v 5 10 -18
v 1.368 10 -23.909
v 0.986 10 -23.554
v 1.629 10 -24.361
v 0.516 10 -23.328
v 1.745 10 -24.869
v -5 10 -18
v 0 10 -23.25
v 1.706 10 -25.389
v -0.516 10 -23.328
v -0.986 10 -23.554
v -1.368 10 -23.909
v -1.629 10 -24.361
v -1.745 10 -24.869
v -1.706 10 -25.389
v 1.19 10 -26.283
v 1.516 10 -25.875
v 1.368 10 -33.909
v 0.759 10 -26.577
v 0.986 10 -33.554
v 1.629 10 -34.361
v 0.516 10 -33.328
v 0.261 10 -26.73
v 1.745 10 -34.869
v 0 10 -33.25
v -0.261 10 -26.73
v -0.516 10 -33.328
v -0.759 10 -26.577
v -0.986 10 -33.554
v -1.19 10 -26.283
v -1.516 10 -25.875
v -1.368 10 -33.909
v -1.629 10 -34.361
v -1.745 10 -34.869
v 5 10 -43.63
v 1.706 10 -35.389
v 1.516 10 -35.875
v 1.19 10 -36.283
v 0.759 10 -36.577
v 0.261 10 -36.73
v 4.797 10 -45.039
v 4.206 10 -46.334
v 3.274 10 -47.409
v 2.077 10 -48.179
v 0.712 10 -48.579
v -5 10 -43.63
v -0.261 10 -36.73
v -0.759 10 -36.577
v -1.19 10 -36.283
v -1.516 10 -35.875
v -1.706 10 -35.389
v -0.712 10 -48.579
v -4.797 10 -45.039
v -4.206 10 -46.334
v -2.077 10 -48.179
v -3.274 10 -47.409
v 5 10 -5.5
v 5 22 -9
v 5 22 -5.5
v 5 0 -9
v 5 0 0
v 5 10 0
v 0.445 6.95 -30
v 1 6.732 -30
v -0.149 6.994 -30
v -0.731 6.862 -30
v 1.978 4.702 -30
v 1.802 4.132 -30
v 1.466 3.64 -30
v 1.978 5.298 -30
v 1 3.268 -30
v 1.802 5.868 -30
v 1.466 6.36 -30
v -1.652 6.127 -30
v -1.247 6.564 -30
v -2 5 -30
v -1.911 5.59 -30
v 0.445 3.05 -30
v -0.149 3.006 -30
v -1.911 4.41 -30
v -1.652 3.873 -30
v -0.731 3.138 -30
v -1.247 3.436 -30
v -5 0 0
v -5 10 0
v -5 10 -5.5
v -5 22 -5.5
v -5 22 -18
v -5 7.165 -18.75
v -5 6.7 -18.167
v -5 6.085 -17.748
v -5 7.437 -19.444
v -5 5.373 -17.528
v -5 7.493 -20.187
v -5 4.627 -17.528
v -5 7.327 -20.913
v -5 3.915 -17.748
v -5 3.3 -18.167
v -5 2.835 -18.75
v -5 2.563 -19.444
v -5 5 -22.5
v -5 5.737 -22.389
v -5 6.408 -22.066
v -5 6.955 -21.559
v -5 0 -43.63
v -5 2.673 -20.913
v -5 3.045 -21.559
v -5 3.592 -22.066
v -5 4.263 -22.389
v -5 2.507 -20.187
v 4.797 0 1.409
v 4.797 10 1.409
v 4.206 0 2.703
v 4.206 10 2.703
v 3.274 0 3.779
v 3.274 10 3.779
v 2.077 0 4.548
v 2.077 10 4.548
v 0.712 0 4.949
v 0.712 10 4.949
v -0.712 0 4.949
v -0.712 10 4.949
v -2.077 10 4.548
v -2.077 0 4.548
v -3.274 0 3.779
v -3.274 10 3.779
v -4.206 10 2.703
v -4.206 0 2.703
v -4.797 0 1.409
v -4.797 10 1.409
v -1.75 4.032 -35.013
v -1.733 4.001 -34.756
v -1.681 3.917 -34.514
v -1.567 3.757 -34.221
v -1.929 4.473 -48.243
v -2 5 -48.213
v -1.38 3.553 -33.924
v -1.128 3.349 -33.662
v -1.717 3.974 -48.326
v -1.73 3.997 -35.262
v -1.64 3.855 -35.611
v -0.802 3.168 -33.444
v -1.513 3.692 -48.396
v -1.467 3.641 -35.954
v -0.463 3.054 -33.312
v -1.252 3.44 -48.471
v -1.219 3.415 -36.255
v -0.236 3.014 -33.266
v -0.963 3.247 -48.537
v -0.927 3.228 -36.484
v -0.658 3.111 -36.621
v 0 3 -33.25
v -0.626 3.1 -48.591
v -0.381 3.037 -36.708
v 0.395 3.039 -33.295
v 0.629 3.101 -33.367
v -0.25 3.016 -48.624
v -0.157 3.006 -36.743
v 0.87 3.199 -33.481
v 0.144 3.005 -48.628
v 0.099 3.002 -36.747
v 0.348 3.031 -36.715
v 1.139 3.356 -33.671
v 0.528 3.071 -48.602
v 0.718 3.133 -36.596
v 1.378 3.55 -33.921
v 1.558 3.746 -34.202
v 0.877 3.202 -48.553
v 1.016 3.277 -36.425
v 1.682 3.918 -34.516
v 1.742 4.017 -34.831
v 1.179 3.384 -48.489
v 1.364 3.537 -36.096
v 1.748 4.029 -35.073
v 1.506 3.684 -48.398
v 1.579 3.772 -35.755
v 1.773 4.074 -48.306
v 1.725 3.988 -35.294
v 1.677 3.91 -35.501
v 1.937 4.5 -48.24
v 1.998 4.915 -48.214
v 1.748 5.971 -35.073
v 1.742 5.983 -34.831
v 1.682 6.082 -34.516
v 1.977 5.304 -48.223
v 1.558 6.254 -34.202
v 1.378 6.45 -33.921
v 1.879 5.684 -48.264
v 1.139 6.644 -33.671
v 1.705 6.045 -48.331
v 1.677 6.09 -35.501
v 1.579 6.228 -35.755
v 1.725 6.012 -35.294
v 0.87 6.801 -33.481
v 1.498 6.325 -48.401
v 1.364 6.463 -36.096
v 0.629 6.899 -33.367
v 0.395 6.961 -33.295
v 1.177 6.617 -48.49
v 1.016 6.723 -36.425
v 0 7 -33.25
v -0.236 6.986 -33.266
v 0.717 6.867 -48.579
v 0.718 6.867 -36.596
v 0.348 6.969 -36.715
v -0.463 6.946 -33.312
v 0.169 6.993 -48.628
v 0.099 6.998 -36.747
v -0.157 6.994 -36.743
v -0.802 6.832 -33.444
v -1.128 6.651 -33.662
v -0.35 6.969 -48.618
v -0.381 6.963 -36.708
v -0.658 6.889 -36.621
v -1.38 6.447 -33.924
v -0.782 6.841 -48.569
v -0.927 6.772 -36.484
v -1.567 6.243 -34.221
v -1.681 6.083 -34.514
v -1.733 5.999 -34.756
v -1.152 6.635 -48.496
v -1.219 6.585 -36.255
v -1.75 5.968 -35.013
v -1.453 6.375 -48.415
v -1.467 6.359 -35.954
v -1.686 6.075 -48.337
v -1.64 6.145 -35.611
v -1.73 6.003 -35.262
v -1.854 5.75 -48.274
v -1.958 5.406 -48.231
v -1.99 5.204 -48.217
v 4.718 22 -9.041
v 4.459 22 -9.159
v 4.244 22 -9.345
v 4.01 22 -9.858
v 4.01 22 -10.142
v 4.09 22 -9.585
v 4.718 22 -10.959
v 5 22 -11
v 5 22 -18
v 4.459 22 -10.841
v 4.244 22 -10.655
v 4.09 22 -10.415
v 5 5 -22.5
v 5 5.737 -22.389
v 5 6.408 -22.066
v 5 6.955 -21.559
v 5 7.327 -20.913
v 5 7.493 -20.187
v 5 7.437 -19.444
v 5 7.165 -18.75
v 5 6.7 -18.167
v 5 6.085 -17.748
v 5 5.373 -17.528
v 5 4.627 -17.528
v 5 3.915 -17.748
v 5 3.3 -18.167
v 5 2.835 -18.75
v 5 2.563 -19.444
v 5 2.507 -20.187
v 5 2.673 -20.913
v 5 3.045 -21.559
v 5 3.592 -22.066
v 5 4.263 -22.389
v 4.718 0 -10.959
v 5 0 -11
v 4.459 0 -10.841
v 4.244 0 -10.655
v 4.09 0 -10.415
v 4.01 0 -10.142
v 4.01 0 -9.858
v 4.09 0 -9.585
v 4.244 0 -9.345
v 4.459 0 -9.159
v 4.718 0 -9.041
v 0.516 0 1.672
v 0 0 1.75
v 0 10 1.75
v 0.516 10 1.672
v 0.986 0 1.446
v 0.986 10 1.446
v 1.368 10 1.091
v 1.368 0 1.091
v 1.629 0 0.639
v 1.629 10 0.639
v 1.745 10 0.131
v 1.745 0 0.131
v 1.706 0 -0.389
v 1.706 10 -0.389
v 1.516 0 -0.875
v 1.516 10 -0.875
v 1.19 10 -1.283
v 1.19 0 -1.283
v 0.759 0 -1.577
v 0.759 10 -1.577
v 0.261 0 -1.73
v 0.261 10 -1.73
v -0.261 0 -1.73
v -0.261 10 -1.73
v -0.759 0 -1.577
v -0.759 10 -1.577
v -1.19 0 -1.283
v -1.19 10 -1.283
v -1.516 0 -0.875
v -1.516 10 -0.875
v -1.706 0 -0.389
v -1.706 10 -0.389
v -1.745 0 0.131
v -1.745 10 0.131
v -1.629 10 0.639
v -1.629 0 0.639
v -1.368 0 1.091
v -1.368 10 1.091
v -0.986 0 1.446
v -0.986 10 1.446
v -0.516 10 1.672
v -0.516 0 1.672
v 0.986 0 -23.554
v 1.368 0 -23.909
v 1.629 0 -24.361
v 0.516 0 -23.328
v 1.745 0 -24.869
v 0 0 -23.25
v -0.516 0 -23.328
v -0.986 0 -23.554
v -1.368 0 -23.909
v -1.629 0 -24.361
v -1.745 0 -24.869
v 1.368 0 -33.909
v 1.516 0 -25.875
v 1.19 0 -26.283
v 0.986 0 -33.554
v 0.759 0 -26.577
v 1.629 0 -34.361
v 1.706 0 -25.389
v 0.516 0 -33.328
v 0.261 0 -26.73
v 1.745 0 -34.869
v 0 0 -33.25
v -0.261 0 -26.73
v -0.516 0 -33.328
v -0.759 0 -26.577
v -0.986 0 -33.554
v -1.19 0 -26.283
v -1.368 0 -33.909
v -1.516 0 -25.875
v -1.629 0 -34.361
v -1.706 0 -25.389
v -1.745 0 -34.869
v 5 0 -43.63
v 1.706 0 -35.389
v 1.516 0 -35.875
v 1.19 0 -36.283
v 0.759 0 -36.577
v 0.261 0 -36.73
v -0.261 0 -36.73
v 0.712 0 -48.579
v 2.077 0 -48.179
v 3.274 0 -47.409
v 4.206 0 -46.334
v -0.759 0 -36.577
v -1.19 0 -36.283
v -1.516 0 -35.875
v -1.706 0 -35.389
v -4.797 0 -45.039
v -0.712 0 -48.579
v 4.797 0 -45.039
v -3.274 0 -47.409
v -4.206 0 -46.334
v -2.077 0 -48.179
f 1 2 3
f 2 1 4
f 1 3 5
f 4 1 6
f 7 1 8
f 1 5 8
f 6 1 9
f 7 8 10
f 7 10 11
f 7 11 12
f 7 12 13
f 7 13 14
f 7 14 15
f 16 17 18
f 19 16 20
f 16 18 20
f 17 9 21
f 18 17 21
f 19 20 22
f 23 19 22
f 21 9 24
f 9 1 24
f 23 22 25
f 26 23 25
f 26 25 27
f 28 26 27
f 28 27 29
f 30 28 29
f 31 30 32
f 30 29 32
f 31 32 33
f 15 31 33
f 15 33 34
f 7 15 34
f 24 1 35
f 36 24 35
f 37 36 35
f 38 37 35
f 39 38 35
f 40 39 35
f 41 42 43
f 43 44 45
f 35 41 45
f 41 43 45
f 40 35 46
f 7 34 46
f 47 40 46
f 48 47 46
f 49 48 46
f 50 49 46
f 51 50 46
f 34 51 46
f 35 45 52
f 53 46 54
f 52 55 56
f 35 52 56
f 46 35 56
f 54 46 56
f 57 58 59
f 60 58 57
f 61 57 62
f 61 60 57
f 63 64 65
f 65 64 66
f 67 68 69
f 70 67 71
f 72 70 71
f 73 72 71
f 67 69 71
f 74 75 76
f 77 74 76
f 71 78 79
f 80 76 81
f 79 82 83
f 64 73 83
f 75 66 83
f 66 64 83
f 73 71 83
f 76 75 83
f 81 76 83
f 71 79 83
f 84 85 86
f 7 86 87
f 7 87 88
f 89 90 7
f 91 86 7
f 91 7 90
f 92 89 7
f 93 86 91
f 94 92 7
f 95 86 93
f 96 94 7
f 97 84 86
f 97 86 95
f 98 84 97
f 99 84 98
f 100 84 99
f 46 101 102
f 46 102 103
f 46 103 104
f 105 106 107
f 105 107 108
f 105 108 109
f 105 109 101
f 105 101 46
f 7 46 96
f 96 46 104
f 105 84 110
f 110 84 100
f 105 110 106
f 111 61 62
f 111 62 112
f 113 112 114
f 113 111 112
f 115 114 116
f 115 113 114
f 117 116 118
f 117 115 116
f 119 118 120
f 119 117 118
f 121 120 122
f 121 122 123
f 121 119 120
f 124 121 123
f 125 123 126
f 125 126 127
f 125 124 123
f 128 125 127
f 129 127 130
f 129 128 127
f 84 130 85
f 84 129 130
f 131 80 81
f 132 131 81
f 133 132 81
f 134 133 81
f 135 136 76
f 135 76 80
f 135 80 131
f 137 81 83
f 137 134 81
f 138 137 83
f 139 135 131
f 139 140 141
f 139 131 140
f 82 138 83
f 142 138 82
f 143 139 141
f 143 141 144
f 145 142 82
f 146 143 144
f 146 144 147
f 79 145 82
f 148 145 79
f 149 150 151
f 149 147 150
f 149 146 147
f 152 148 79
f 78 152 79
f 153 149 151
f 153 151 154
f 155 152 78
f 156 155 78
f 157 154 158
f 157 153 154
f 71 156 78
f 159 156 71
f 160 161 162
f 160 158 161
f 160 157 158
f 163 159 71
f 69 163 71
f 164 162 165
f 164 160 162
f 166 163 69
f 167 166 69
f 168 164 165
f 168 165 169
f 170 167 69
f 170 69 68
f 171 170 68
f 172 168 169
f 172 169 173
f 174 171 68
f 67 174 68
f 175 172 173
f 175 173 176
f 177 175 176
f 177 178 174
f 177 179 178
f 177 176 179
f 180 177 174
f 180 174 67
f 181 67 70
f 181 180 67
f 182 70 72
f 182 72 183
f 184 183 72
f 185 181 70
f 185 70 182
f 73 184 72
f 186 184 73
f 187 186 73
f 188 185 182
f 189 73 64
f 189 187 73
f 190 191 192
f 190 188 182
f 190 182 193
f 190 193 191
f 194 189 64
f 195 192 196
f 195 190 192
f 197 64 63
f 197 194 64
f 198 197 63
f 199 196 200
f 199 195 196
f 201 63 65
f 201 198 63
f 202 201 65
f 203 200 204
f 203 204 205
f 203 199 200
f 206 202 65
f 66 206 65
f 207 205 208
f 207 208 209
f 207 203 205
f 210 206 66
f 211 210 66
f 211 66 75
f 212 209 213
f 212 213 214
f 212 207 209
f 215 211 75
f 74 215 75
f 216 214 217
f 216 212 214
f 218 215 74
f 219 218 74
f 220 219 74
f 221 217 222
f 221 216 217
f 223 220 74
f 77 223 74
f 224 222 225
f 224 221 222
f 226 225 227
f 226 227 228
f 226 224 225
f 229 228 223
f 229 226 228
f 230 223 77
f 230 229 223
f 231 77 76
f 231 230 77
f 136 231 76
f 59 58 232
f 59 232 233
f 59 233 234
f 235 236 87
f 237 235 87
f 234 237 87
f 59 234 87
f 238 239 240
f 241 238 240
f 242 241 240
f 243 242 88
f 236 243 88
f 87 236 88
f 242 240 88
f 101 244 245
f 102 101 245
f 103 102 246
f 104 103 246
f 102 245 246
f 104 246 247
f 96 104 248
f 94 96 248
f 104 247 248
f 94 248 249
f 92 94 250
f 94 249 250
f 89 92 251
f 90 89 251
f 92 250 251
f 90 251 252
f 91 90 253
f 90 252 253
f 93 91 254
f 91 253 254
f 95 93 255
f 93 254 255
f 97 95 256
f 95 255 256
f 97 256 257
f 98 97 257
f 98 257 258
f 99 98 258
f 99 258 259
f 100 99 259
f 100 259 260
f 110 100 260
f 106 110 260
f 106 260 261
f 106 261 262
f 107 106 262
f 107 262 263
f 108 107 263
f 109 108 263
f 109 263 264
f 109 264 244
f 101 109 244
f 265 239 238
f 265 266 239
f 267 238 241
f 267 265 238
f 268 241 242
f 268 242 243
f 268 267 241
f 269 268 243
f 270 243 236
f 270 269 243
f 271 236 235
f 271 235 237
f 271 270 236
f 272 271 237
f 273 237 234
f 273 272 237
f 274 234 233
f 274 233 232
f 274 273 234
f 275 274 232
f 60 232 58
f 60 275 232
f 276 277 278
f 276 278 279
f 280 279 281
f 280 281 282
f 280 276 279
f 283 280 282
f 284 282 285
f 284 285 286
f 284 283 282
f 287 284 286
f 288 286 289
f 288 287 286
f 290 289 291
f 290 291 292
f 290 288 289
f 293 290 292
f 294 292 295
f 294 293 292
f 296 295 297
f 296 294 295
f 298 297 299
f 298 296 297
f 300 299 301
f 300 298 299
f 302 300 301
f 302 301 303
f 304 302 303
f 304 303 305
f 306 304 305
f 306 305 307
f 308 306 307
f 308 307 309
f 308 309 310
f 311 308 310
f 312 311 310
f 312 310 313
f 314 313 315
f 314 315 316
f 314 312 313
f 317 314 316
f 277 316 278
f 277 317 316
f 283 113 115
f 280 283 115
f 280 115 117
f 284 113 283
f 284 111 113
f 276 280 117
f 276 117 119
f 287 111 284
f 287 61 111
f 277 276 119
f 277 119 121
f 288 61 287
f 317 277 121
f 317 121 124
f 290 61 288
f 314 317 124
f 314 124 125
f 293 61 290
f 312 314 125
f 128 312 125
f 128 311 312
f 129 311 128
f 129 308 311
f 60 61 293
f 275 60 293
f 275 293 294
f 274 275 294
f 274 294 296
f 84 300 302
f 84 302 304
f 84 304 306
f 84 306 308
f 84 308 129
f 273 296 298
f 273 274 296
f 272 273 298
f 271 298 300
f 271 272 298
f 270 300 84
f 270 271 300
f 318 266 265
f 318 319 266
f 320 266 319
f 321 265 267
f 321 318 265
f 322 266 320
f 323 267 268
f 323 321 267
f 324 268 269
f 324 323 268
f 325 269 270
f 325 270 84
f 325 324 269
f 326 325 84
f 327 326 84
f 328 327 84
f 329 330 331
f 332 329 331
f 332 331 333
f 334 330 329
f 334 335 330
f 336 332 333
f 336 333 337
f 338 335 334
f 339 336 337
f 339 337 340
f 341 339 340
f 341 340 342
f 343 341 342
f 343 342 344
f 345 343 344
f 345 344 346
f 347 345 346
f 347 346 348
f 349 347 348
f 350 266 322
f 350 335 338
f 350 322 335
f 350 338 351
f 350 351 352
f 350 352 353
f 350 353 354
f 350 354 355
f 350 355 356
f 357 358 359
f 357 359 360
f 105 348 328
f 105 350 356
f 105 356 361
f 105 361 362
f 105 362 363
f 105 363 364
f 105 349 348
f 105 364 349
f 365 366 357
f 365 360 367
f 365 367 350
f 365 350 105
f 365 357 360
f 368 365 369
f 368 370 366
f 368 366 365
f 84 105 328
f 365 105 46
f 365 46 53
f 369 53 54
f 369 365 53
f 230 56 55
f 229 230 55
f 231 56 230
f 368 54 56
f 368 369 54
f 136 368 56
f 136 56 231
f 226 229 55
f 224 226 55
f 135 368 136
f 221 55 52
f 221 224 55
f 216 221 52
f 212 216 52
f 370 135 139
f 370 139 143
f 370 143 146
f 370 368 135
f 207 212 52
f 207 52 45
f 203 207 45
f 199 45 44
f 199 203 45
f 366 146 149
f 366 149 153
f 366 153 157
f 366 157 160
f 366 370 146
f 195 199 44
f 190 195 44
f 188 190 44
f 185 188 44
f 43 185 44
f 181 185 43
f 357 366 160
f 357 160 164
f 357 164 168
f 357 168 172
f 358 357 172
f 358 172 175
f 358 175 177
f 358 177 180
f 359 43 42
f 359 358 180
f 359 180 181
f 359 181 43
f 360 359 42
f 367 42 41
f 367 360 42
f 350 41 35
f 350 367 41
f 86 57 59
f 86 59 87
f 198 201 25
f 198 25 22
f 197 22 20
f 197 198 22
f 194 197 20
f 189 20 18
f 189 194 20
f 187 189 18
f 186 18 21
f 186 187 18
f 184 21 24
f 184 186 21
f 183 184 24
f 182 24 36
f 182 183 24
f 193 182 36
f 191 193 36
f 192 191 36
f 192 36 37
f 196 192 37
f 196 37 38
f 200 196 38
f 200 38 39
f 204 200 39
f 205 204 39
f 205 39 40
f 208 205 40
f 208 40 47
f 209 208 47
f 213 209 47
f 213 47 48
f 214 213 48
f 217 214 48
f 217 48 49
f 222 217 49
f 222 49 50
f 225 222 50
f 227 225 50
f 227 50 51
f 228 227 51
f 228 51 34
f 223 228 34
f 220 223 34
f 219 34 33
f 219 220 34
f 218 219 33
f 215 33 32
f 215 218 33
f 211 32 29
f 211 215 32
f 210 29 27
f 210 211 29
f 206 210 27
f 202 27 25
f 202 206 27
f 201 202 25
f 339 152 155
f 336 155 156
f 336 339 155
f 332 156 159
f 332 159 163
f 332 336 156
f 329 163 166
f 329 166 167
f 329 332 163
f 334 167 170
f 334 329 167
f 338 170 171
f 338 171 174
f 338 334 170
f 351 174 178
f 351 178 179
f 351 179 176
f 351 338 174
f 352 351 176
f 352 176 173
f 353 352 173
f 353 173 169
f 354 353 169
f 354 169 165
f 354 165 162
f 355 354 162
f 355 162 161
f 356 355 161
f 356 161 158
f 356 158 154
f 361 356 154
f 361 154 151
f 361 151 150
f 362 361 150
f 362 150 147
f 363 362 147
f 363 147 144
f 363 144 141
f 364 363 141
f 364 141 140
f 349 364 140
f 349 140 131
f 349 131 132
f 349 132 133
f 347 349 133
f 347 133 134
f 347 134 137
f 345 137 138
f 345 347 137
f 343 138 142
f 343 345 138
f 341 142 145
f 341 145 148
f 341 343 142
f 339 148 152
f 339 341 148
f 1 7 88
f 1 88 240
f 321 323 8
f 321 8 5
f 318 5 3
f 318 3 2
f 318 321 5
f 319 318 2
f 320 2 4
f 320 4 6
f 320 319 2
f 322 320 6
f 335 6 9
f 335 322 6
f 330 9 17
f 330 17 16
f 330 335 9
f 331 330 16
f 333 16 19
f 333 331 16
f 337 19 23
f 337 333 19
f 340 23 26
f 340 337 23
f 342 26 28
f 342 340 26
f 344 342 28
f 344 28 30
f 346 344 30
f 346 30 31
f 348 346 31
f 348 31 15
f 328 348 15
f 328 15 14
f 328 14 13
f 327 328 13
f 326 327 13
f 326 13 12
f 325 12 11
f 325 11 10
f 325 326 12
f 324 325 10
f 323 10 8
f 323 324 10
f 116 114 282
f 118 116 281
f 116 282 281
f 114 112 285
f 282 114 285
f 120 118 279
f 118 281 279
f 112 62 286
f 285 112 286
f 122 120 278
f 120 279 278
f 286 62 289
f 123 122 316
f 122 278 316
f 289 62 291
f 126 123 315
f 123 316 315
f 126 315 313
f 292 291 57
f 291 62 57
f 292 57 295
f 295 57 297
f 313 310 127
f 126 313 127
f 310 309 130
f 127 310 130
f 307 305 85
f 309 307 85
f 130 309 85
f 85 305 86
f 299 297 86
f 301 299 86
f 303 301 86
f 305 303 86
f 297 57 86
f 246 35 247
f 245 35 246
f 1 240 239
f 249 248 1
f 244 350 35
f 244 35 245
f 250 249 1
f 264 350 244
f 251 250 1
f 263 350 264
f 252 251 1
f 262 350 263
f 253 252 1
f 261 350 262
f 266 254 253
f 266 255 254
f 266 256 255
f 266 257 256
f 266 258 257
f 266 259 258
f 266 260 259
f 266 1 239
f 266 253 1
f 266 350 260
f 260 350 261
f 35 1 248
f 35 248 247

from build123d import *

# Parameters (mm, degrees)
SKETCH1_R           = 1.75
BOSS_EXTRUDE1_DEPTH = 10
SKETCH2_R           = 2.5
CUT_EXTRUDE1_DEPTH  = 51.644943511
BOSS_EXTRUDE2_DEPTH = 12
SKETCH4_R           = 2
CUT_EXTRUDE2_DEPTH  = 25


with BuildPart() as part:
    # Sketch1 → Boss-Extrude1 (new body)
    with BuildSketch(Plane(origin=(0, 0, 0), x_dir=(1, 0, 0), z_dir=(0, 1, 0))):
        with BuildLine():
            Line((-5, 0), (-5, 43.630343442))
            ThreePointArc((-5, 43.630343442), (0, 48.630343442), (5, 43.630343442))
            Line((5, 43.630343442), (5, 11))
            ThreePointArc((5, 11), (4, 10), (5, 9))
            Line((5, 9), (5, 0))
            ThreePointArc((5, 0), (0, -5), (-5, 0))
        make_face()
        with Locations(Location((0, 0, 0), (0, 0, 270))):
            Circle(SKETCH1_R, mode=Mode.SUBTRACT)
        with Locations(Location((0, 25, 0), (0, 0, 270))):
            Circle(SKETCH1_R, mode=Mode.SUBTRACT)
        with Locations(Location((0, 35, 0), (0, 0, 270))):
            Circle(SKETCH1_R, mode=Mode.SUBTRACT)
    extrude(amount=BOSS_EXTRUDE1_DEPTH)

    # Sketch2 → Cut-Extrude1 (cut, through all)
    with BuildSketch(Plane(origin=(5, 0, 0), x_dir=(0, 0, -1), z_dir=(1, 0, 0))):
        with Locations((20, 5)):
            Circle(SKETCH2_R)
    extrude(amount=-CUT_EXTRUDE1_DEPTH, mode=Mode.SUBTRACT)

    # Sketch3 → Boss-Extrude2 (add)
    with BuildSketch(Plane(origin=(0, 10, 0), x_dir=(1, 0, 0), z_dir=(0, 1, 0))):
        with BuildLine():
            Line((5, 5.5), (-5, 5.5))
            Line((-5, 5.5), (-5, 18))
            Line((-5, 18), (5, 18))
            Line((5, 18), (5, 11))
            ThreePointArc((5, 11), (4, 10), (5, 9))
            Line((5, 9), (5, 5.5))
        make_face()
    extrude(amount=BOSS_EXTRUDE2_DEPTH)

    # Sketch4 → Cut-Extrude2 (cut)
    with BuildSketch(Plane.XY.offset(-55)):
        with Locations(Location((0, 5, 0), (0, 0, 180))):
            Circle(SKETCH4_R)
    extrude(amount=CUT_EXTRUDE2_DEPTH, mode=Mode.SUBTRACT)


solid = part.part
